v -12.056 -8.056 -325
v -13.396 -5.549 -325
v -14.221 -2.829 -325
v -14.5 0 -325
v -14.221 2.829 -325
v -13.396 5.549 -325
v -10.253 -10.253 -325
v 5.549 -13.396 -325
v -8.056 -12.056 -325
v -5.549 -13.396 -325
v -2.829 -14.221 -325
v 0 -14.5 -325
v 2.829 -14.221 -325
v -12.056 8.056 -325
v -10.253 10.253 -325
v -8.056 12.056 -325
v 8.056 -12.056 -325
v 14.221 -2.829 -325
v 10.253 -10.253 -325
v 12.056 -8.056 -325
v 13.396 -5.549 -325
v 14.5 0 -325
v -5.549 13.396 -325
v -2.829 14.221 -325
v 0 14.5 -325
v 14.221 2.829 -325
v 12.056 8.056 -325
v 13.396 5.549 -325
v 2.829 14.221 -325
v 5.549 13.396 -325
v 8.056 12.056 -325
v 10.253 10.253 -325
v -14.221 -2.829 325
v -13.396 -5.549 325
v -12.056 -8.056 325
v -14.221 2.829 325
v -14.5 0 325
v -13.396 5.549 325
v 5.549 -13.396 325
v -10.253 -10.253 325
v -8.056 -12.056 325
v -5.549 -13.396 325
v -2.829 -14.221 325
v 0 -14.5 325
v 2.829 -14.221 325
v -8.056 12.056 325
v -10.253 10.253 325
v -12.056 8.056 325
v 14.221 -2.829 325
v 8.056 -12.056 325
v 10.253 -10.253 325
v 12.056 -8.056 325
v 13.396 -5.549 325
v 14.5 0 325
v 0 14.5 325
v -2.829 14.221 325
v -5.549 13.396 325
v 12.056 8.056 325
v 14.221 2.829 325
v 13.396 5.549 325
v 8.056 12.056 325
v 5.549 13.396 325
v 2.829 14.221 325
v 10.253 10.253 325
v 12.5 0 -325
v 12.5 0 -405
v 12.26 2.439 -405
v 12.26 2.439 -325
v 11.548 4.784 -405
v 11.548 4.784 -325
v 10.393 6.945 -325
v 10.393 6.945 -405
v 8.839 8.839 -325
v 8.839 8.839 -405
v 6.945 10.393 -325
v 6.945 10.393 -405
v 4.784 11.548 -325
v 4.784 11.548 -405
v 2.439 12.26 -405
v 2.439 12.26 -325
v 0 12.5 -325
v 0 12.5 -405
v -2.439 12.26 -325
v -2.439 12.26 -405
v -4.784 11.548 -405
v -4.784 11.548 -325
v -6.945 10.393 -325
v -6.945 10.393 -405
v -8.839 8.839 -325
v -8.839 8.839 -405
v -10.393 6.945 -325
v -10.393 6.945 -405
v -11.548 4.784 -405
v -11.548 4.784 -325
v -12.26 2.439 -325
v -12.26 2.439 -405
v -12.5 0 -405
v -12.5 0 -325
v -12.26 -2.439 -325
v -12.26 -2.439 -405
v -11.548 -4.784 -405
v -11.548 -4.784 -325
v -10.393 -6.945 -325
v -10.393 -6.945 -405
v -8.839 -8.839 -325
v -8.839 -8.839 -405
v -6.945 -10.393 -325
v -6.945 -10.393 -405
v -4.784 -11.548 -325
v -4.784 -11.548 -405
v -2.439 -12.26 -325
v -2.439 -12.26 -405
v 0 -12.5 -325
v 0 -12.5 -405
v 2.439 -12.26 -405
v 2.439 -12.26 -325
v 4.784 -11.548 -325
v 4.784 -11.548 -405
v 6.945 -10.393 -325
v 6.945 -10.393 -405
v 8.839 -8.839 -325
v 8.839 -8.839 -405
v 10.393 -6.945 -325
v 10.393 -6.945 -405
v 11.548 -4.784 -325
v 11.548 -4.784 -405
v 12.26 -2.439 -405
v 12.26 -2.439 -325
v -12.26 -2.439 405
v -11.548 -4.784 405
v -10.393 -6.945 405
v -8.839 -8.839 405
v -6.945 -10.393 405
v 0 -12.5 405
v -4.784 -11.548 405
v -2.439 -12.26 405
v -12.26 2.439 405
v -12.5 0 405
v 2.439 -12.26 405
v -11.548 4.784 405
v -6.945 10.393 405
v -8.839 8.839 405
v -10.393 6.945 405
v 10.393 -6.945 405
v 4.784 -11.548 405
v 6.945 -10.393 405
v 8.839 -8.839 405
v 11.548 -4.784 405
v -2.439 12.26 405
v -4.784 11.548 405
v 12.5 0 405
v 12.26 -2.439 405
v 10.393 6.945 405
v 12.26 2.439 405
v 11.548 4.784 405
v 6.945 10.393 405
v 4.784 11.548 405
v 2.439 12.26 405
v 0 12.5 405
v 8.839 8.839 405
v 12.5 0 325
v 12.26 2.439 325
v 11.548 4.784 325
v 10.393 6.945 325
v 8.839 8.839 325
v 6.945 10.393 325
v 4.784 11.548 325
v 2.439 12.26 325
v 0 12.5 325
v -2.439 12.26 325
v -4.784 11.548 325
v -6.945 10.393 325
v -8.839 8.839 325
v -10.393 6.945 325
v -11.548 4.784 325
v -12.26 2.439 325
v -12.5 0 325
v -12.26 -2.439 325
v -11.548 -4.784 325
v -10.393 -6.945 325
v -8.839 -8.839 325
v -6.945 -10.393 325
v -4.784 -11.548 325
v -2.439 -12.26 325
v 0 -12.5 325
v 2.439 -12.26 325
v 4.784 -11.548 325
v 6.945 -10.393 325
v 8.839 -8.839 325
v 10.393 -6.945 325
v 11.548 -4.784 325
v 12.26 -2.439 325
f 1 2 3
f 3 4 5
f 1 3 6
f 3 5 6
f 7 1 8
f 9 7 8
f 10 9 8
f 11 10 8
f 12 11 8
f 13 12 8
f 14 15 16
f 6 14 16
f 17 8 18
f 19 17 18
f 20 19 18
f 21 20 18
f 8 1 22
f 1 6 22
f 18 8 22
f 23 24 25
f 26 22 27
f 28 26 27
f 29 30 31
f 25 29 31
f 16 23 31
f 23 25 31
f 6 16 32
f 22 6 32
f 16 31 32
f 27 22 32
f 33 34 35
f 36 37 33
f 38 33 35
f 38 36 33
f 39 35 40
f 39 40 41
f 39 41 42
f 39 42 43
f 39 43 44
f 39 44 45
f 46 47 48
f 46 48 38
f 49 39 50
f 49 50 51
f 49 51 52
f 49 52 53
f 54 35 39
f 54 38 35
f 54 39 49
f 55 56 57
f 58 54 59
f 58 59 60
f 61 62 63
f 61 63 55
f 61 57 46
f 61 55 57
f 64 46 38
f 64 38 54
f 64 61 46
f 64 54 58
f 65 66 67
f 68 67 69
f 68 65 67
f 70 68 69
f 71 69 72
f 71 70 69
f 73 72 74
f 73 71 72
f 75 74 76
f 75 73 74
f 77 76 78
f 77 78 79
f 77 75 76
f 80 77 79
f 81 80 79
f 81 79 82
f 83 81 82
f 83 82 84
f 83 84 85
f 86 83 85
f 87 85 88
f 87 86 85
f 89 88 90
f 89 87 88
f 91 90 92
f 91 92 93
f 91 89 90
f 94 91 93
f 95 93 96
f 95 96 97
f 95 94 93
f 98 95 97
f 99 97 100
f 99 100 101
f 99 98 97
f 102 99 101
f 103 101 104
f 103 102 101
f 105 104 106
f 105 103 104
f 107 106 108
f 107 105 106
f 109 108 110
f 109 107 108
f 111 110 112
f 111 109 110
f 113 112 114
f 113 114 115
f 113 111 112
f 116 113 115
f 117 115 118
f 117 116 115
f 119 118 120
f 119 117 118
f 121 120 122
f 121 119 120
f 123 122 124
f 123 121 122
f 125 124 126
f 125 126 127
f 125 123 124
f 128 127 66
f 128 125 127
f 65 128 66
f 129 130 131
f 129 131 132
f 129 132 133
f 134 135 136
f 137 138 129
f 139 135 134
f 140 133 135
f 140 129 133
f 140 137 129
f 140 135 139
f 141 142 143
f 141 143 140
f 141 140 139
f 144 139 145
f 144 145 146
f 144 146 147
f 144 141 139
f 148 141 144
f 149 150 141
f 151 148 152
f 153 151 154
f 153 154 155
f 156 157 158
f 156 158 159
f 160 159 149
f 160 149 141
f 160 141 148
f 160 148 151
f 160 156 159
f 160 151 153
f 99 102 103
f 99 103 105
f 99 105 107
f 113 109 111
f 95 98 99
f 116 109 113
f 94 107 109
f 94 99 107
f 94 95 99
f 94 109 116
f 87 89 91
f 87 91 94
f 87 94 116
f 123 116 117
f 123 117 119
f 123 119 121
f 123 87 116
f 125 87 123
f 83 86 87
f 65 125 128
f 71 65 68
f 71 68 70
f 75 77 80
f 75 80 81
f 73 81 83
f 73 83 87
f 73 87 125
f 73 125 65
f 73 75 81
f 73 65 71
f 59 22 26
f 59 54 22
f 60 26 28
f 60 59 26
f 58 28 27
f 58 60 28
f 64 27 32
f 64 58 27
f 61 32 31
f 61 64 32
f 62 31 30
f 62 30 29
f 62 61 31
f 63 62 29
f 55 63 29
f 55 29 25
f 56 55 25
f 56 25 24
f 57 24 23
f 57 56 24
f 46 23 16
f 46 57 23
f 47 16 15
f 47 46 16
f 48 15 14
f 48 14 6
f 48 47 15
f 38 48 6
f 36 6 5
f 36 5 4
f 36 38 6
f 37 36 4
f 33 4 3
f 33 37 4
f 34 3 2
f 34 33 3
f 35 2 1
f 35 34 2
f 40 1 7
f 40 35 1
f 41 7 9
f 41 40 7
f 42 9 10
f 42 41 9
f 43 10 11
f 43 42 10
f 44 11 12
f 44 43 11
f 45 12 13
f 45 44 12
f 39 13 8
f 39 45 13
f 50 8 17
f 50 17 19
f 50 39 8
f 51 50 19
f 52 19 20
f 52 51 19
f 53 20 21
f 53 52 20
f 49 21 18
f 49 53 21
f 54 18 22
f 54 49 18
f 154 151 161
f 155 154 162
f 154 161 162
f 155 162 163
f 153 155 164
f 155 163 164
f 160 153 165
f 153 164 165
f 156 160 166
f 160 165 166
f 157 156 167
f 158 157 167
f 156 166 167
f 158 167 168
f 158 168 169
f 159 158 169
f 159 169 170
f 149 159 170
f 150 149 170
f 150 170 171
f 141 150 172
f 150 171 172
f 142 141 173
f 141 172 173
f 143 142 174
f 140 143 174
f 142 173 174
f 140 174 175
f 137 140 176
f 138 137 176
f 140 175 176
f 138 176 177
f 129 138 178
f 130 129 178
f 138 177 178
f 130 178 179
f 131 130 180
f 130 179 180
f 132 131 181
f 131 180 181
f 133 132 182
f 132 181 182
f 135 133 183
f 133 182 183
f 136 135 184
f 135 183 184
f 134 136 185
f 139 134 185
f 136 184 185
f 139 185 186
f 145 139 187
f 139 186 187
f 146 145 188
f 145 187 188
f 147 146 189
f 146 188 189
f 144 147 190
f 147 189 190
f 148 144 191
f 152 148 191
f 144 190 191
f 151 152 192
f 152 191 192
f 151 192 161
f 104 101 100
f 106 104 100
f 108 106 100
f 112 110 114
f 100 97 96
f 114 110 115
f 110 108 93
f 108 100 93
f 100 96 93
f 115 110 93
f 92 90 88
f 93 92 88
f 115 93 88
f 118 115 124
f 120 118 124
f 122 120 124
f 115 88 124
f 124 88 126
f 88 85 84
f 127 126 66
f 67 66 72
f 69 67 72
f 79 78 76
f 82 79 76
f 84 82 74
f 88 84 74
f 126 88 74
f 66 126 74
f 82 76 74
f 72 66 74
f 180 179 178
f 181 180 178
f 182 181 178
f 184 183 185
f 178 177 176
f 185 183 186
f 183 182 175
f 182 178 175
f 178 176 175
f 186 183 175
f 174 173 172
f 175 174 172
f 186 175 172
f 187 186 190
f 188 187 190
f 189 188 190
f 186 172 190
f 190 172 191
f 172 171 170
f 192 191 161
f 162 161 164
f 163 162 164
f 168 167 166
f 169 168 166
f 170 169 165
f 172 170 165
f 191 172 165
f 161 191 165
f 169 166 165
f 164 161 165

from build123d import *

# Parameters (mm, degrees)
SKETCH1_R           = 14.5
BOSS_EXTRUDE1_DEPTH = 325
SKETCH2_R           = 12.5
BOSS_EXTRUDE2_DEPTH = 80


with BuildPart() as part:
    # Sketch1 → Boss-Extrude1 (new body, symmetric)
    with BuildSketch(Plane.XY):
        Circle(SKETCH1_R)
    extrude(amount=BOSS_EXTRUDE1_DEPTH, both=True)


with BuildPart() as body_2:
    # Sketch2 → Boss-Extrude2 (new body)
    with BuildSketch(Plane.XY.offset(325)):
        Circle(SKETCH2_R)
    extrude(amount=BOSS_EXTRUDE2_DEPTH)


with BuildPart() as body_3:
    # Mirror1: mirrored copy
    add(body_2.part.mirror(Plane.XY))


solid = Compound([part.part, body_2.part, body_3.part])
